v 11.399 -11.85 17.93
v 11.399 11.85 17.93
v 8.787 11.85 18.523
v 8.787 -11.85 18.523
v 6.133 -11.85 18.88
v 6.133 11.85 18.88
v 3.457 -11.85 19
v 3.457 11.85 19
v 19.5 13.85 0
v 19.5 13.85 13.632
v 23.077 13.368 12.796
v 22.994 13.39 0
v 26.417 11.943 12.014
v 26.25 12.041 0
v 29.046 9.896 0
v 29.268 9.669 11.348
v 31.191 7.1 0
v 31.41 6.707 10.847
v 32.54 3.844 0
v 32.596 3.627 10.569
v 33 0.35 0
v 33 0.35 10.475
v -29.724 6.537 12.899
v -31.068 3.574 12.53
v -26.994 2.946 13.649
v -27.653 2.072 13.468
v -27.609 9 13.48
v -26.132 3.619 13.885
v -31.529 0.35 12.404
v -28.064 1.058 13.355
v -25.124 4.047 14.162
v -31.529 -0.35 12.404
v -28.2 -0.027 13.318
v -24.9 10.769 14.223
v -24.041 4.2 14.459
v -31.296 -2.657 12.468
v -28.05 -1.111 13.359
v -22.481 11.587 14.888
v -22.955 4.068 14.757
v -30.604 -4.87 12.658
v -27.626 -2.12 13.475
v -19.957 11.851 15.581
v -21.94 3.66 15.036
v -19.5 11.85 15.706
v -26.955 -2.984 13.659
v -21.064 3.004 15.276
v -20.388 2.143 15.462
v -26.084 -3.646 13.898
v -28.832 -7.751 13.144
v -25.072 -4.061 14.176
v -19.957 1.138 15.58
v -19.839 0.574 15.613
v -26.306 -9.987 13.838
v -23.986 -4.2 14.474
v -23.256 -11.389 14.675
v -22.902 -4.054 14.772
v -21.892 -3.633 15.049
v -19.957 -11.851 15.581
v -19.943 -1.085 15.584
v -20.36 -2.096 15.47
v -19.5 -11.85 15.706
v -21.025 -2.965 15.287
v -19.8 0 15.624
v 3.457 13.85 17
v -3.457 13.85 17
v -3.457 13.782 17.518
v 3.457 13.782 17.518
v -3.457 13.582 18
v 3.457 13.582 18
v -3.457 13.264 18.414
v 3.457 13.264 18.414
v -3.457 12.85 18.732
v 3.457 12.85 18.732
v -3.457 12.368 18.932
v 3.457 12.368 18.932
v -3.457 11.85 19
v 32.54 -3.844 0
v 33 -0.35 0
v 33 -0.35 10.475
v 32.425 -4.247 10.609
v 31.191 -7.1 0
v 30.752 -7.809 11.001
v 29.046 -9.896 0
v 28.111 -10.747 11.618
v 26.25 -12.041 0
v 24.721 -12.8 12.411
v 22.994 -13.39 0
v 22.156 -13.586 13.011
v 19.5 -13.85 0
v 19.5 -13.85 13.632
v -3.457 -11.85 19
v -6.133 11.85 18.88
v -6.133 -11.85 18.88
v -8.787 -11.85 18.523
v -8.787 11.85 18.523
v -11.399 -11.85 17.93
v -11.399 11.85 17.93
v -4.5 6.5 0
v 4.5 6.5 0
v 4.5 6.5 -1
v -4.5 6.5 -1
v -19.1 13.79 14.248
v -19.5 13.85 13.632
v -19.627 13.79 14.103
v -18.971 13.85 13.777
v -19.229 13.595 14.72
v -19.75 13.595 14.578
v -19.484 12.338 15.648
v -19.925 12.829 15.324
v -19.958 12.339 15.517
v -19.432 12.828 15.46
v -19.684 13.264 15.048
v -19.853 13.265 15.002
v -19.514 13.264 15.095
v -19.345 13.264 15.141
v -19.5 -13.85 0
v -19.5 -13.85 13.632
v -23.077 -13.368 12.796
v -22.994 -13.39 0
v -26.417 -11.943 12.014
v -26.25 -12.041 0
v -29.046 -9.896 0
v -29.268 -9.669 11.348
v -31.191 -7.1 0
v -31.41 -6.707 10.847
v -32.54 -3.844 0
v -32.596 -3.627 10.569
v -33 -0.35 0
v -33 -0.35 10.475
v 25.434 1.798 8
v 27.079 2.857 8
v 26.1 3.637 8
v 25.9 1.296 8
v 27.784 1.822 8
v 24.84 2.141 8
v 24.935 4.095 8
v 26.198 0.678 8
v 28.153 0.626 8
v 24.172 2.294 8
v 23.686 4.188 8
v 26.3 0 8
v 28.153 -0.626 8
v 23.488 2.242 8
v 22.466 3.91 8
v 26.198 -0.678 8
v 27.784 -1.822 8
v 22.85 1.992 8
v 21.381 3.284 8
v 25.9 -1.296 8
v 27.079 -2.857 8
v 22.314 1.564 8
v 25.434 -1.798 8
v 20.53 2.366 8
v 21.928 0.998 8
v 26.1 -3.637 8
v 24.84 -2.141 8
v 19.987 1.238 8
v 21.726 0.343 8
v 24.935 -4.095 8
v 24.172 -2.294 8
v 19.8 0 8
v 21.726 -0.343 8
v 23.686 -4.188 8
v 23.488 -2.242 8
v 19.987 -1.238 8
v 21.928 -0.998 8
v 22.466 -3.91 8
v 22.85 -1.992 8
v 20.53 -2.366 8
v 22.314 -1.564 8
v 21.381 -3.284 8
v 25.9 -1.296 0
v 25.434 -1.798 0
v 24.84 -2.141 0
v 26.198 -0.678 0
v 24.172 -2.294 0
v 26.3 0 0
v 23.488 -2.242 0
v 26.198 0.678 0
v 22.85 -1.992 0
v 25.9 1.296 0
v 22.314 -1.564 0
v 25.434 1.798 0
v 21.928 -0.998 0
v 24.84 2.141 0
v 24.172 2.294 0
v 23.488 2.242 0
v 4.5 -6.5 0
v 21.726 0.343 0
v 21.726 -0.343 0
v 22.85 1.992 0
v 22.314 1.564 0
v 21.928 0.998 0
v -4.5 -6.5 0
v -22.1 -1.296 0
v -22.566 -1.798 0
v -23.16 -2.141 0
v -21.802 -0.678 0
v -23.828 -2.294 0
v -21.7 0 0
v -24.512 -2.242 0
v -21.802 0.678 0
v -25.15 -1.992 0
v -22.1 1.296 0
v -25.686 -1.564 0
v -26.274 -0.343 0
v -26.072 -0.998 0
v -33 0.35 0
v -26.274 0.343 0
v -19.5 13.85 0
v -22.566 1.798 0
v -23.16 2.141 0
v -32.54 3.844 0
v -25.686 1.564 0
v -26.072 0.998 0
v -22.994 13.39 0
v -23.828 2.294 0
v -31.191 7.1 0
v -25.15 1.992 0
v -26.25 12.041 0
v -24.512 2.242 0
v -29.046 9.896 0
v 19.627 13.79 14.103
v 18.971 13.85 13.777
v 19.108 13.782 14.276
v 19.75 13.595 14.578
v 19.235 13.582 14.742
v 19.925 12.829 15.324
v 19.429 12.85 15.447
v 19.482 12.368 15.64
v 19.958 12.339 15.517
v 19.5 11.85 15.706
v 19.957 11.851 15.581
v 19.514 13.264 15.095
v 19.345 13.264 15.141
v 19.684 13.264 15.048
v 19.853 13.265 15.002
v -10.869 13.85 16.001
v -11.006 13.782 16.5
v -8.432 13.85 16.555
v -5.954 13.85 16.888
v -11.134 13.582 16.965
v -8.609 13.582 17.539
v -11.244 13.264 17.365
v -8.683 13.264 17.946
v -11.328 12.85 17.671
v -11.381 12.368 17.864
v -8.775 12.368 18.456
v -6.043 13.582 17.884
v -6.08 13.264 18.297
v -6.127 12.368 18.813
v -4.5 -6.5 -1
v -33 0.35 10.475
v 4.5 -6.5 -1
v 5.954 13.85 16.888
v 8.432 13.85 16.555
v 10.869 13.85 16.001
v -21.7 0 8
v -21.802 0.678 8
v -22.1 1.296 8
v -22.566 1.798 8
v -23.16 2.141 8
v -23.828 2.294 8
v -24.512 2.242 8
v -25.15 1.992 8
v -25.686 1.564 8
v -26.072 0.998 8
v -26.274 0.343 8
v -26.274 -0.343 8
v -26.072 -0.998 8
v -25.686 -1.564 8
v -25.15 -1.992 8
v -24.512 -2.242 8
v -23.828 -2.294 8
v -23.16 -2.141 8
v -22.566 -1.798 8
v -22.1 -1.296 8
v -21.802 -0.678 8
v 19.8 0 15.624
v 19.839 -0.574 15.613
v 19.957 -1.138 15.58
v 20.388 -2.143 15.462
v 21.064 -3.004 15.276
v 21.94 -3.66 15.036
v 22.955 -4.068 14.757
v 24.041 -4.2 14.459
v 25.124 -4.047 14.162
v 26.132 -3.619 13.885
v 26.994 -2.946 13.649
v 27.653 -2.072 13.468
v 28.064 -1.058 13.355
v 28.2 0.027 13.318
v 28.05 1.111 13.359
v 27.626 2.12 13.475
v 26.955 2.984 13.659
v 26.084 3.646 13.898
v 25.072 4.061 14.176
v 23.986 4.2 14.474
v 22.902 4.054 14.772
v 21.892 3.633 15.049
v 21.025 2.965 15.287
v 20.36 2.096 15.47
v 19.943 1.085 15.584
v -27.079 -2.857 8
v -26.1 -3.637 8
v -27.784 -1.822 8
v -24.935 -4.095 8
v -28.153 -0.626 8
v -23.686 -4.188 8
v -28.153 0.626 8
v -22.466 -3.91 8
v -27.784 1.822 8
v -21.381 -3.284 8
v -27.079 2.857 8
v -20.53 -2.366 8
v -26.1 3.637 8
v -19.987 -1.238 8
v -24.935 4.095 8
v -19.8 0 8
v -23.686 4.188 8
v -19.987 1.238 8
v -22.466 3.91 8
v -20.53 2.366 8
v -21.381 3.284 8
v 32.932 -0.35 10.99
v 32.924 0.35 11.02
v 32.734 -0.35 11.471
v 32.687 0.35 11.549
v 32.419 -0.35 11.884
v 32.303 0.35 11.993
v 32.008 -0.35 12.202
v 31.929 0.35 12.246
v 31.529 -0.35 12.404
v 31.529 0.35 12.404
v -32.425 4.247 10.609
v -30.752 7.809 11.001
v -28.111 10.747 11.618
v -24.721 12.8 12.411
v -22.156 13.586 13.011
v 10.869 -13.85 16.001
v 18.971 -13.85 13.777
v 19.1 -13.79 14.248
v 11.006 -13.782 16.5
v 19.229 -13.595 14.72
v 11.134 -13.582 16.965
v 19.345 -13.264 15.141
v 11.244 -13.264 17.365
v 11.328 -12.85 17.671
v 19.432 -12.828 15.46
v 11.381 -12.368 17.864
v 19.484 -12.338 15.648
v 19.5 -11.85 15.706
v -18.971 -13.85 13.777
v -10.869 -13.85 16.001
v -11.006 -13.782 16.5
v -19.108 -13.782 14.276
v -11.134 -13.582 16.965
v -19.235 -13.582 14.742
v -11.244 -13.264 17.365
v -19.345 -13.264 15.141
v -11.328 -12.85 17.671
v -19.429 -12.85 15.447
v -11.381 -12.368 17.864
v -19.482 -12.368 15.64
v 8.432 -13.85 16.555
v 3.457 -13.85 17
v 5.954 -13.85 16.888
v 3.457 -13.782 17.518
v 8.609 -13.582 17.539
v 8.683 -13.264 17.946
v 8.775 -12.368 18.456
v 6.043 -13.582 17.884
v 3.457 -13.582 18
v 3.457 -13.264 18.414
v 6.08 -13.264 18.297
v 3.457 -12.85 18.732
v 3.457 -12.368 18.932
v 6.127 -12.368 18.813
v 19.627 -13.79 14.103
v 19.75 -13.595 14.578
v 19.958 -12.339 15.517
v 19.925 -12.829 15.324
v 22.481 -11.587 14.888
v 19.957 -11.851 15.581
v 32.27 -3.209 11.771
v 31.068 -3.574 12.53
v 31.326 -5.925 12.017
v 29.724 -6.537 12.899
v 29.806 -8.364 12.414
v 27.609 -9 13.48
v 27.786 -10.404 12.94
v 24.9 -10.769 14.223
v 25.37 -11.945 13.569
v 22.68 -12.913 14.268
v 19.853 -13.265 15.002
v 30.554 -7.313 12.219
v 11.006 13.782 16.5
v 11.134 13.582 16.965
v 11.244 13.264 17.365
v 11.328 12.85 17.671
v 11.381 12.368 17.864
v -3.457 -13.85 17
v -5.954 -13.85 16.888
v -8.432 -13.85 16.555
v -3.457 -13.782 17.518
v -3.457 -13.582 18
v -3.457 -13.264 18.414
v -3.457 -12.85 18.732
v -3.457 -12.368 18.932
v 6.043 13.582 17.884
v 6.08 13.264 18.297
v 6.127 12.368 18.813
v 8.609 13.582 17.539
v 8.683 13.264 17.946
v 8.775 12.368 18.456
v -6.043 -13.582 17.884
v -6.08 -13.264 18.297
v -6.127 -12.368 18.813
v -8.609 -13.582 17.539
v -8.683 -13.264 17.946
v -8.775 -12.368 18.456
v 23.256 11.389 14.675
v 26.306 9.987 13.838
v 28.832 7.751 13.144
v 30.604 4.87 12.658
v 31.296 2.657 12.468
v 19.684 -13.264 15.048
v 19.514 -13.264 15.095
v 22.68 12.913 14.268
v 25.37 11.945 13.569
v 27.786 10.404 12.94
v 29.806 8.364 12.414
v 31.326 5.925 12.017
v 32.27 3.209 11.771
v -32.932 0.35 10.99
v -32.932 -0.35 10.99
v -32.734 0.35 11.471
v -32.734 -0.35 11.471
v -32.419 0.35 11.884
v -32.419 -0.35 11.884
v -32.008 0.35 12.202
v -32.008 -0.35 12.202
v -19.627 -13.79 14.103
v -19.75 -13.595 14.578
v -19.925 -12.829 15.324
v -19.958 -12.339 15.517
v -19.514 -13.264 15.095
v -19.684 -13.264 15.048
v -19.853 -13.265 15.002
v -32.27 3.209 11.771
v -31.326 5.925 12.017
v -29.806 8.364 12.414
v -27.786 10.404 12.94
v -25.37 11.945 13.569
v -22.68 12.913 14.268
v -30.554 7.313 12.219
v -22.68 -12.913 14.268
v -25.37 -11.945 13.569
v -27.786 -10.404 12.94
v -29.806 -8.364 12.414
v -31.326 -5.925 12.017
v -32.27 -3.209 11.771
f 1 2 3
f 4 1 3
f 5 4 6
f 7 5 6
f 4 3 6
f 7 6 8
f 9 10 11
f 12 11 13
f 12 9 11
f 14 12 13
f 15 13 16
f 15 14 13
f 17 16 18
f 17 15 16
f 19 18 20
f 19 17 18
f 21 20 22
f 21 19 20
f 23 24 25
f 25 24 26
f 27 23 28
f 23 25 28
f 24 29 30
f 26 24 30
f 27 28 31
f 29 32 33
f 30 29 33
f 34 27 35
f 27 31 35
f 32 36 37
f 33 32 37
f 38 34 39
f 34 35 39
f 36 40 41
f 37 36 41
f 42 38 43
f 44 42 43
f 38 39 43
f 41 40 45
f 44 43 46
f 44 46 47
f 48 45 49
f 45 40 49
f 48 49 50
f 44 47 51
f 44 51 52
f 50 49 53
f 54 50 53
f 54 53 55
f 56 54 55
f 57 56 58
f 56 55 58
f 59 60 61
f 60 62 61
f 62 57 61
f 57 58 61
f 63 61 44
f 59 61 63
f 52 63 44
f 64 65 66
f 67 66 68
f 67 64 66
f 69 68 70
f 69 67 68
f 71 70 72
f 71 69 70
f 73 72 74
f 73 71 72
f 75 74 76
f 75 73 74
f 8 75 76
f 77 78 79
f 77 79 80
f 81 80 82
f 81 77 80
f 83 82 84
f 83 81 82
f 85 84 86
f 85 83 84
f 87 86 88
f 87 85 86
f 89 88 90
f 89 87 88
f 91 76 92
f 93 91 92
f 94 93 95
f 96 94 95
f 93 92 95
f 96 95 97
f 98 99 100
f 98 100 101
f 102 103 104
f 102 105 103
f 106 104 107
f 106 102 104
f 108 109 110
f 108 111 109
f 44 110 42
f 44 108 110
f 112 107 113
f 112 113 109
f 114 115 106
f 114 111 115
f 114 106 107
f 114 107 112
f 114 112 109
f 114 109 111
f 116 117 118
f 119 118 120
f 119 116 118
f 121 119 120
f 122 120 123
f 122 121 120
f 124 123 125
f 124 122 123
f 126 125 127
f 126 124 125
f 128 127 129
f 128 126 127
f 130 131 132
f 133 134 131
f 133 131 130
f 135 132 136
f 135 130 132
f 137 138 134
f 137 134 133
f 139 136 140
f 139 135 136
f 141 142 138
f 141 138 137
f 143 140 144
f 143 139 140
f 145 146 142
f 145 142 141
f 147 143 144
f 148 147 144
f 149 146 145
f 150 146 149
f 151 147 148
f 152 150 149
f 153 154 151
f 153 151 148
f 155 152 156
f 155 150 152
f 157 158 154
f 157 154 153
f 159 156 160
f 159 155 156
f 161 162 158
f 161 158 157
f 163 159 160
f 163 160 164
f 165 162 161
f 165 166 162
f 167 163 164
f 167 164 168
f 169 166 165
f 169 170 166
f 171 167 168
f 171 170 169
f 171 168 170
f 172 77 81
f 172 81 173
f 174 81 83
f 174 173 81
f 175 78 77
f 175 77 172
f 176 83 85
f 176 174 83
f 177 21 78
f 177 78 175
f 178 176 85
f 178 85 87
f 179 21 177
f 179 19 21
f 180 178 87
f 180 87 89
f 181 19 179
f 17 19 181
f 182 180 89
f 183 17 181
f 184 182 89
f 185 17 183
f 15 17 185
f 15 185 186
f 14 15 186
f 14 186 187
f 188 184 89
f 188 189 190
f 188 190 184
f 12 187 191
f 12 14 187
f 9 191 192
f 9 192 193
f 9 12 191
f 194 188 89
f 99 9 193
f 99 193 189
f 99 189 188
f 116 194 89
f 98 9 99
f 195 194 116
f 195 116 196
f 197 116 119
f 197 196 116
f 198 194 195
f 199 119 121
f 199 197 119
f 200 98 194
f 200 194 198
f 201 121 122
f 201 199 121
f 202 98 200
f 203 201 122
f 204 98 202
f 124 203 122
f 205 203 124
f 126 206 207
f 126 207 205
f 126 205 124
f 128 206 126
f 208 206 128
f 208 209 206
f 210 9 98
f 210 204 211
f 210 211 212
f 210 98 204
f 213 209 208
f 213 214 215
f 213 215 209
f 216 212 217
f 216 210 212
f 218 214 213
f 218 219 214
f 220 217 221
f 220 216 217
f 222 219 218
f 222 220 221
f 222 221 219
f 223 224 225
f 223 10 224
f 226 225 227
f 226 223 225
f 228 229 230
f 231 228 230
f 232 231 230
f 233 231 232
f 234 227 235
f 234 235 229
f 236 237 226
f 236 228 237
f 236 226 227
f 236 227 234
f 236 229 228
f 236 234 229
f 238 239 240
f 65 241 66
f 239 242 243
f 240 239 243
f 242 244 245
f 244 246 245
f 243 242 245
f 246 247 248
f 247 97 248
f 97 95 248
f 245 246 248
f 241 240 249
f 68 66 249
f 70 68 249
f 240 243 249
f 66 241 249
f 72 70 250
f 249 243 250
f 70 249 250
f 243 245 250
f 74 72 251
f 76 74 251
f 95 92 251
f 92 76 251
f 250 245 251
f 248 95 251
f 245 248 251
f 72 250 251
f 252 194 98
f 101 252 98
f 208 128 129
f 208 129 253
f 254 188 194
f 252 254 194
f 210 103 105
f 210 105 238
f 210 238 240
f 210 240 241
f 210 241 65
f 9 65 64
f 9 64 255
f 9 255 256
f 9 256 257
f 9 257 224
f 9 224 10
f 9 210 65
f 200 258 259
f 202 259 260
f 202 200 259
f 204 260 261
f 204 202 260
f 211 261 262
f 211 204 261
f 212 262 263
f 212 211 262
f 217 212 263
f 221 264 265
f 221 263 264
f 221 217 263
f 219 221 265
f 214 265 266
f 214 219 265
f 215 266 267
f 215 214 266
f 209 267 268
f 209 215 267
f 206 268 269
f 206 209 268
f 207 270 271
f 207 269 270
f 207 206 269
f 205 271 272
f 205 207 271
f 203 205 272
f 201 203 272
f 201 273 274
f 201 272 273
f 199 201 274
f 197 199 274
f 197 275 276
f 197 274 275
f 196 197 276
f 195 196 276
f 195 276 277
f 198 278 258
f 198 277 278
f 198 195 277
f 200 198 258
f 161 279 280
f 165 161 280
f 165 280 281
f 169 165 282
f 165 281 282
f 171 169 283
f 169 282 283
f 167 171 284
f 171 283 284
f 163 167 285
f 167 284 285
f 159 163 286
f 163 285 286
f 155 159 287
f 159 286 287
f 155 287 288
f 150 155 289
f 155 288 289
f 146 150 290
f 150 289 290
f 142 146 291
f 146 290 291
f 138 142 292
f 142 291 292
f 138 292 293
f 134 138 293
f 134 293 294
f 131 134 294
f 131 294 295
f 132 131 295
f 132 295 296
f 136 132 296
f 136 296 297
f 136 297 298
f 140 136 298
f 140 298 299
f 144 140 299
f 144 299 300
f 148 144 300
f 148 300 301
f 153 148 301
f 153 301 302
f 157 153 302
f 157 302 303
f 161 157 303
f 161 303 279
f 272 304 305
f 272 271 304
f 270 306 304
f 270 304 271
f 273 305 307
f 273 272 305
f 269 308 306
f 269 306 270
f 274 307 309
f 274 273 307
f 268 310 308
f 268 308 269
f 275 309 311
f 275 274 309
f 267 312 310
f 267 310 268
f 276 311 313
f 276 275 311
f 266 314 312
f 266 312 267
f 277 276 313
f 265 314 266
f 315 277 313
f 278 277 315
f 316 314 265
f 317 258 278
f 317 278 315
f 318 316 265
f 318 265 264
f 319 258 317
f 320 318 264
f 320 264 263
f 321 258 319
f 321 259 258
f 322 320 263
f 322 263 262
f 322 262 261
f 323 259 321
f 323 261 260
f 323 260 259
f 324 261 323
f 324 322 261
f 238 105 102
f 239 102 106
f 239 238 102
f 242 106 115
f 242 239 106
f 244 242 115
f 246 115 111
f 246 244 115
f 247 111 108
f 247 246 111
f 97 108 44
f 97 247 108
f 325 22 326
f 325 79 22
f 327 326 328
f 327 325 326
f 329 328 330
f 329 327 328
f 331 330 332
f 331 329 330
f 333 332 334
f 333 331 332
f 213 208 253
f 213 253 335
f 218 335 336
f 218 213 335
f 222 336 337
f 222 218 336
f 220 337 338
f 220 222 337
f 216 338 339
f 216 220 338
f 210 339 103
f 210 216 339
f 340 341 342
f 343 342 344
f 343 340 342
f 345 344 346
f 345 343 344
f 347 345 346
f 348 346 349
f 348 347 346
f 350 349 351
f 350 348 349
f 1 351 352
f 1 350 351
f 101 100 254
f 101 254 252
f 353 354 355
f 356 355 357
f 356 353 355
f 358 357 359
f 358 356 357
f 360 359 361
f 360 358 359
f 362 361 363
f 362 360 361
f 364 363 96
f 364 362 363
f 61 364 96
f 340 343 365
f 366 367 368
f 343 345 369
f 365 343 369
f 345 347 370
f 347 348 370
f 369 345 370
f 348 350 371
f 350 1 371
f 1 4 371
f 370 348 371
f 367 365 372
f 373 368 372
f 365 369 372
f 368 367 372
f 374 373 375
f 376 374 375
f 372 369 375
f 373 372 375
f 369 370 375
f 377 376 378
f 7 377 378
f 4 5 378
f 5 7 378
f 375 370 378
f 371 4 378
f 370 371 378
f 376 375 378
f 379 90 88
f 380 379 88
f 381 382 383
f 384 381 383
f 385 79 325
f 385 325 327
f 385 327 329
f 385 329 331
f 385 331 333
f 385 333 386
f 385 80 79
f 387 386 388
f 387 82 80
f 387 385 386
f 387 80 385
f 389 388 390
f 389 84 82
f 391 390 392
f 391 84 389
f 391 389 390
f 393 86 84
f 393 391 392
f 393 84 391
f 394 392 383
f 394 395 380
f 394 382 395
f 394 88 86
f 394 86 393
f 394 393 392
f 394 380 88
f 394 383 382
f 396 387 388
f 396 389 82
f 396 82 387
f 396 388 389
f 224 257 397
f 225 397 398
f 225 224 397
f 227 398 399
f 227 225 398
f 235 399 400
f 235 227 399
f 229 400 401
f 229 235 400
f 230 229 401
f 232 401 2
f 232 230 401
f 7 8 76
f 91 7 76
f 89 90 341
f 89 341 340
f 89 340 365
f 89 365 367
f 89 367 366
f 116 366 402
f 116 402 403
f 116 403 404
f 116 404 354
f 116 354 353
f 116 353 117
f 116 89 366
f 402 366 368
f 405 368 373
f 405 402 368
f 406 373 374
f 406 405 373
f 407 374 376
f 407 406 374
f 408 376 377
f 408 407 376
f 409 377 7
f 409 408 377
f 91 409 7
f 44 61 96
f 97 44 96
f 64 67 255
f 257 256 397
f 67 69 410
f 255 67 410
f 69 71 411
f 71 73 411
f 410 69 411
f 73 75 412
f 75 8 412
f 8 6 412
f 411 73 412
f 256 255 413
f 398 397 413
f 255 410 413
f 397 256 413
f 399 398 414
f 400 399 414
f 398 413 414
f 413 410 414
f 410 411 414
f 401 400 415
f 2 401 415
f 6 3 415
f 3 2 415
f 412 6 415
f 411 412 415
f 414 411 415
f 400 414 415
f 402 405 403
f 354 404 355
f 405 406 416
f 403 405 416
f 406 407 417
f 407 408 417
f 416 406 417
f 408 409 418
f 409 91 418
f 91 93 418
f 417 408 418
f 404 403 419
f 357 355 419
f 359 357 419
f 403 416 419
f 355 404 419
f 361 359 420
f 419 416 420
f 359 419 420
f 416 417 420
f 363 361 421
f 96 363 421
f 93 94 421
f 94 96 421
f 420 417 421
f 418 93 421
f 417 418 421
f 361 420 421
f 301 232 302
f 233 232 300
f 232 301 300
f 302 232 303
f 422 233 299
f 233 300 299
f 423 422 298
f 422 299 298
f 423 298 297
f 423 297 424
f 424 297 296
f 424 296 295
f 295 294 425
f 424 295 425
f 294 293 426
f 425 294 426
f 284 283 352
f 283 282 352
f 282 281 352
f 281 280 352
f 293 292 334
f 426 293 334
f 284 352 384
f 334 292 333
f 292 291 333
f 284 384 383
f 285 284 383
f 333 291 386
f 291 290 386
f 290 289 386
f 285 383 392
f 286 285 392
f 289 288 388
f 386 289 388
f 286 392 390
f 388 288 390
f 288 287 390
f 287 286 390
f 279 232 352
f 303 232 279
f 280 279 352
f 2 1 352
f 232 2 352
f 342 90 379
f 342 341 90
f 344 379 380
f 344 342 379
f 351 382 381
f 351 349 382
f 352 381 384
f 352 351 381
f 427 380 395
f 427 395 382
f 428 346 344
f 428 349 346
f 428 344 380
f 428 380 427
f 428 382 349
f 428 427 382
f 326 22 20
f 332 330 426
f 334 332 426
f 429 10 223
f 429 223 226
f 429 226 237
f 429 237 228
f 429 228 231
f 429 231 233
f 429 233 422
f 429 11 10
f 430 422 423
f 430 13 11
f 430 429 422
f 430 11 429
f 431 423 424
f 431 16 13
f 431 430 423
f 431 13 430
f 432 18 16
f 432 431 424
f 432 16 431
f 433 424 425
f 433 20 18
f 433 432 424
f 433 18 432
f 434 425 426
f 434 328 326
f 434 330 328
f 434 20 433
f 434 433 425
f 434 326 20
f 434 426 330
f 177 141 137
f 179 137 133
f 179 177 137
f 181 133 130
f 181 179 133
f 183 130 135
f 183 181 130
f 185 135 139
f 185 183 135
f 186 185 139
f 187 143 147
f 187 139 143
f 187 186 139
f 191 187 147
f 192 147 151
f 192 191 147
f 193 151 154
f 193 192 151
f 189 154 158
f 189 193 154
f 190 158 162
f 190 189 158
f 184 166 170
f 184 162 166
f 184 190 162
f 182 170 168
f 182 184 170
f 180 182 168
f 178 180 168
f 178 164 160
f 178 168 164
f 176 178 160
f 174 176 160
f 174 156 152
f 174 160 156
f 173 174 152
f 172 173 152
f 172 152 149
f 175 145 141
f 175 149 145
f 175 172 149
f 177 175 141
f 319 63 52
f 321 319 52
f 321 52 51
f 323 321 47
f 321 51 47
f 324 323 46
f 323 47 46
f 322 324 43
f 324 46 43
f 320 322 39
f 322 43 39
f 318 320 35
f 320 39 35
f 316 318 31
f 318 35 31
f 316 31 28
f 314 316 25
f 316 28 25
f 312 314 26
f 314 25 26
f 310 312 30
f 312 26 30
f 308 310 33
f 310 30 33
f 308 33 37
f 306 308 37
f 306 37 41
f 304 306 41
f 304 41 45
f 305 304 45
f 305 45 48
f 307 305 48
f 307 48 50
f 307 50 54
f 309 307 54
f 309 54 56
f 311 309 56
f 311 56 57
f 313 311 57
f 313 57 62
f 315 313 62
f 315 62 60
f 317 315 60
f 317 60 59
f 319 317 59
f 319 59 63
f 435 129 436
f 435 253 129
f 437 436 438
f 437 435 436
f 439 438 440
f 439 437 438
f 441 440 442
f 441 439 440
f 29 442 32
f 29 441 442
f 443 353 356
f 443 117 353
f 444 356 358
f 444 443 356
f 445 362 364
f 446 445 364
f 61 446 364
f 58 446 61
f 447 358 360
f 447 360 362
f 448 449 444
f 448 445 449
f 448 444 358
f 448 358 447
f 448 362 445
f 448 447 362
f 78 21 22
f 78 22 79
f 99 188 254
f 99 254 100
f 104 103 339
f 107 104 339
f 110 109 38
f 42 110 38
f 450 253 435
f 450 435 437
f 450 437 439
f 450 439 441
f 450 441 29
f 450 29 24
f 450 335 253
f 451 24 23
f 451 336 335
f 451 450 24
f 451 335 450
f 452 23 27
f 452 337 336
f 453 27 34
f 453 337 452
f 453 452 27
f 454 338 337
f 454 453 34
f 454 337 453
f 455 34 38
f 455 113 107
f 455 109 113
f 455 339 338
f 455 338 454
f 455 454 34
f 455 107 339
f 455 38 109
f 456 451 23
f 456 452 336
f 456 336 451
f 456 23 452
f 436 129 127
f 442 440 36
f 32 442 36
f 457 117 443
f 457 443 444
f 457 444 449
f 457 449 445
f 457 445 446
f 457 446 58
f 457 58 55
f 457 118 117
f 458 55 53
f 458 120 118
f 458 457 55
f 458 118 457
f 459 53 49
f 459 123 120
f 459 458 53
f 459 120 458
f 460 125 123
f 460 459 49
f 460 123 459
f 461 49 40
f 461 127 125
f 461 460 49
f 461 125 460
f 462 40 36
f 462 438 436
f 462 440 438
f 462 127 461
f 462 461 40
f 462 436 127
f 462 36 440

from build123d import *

# Parameters (mm, degrees)
SKETCH1_R           = 2.3
BOSS_EXTRUDE1_DEPTH = 19
CUT_EXTRUDE1_DEPTH  = 48.088108902
FILLET1_R           = 30
FILLET2_R           = 2
SKETCH3_R           = 4.2
CUT_EXTRUDE2_DEPTH  = 11
SKETCH4_W           = 9
SKETCH4_H           = 13
BOSS_EXTRUDE2_DEPTH = 1


with BuildPart() as part:
    # Sketch1 → Boss-Extrude1 (new body)
    with BuildSketch(Plane.XY):
        with BuildLine():
            Line((-19.5, 13.85), (19.5, 13.85))
            ThreePointArc((19.5, 13.85), (29.045941546, 9.895941546), (33, 0.35))
            Line((33, 0.35), (33, -0.35))
            ThreePointArc((33, -0.35), (29.045941546, -9.895941546), (19.5, -13.85))
            Line((19.5, -13.85), (-19.5, -13.85))
            ThreePointArc((-19.5, -13.85), (-29.045941546, -9.895941546), (-33, -0.35))
            Line((-33, -0.35), (-33, 0.35))
            ThreePointArc((-33, 0.35), (-29.045941546, 9.895941546), (-19.5, 13.85))
        make_face()
        with Locations((-24, 0)):
            Circle(SKETCH1_R, mode=Mode.SUBTRACT)
        with Locations((24, 0)):
            Circle(SKETCH1_R, mode=Mode.SUBTRACT)
    extrude(amount=BOSS_EXTRUDE1_DEPTH)

    # Sketch2 → Cut-Extrude1 (cut, through all)
    with BuildSketch(Plane.XZ.offset(13.85)):
        Polygon((-19.5, 19), (-19.5, 15.705882353), (-7.5, 19), align=None)
        Polygon((-33, 12), (-19.5, 15.705882353), (-19.5, 19), (-33, 19), align=None)
        Polygon((7.5, 19), (19.5, 15.705882353), (19.5, 19), align=None)
        Polygon((19.5, 19), (19.5, 15.705882353), (33, 12), (33, 19), align=None)
    extrude(amount=-CUT_EXTRUDE1_DEPTH, mode=Mode.SUBTRACT)

    # Fillet1
    fillet1_edges = [part.edges().sort_by_distance(p)[0] for p in [
        (-7.5, 0, 19),
        (7.5, 0, 19),
    ]]
    fillet(fillet1_edges, radius=FILLET1_R)

    # Fillet2
    fillet2_edges = [part.edges().sort_by_distance(p)[0] for p in [
        (-33, 0, 12),
        (-15.449321203, -13.85, 16.817833395),
        (-28.958901568, 9.982195032, 13.109321138),
        (-15.449321203, 13.85, 16.817833395),
        (-28.958901568, -9.982195032, 13.109321138),
        (33, 0, 12),
        (15.449321203, -13.85, 16.817833395),
        (28.958901568, 9.982195032, 13.109321138),
        (28.958901568, -9.982195032, 13.109321138),
        (15.449321203, 13.85, 16.817833395),
        (0, -13.85, 19),
        (-7.463781607, -13.85, 18.731242264),
        (7.463781607, -13.85, 18.731242264),
        (0, 13.85, 19),
        (-7.463781607, 13.85, 18.731242264),
        (7.463781607, 13.85, 18.731242264),
    ]]
    fillet(fillet2_edges, radius=FILLET2_R)

    # Sketch3 → Cut-Extrude2 (cut)
    with BuildSketch(Plane.XY.offset(19)):
        with Locations((-24, 0)):
            Circle(SKETCH3_R)
        with Locations(Location((24, 0, 0), (0, 0, 180))):
            Circle(SKETCH3_R)
    extrude(amount=-CUT_EXTRUDE2_DEPTH, mode=Mode.SUBTRACT)

    # Sketch4 → Boss-Extrude2 (add)
    with BuildSketch(Plane(origin=(0, 0, 0), x_dir=(-1, 0, 0), z_dir=(0, 0, -1))):
        Rectangle(SKETCH4_W, SKETCH4_H)
    extrude(amount=BOSS_EXTRUDE2_DEPTH)


solid = part.part
